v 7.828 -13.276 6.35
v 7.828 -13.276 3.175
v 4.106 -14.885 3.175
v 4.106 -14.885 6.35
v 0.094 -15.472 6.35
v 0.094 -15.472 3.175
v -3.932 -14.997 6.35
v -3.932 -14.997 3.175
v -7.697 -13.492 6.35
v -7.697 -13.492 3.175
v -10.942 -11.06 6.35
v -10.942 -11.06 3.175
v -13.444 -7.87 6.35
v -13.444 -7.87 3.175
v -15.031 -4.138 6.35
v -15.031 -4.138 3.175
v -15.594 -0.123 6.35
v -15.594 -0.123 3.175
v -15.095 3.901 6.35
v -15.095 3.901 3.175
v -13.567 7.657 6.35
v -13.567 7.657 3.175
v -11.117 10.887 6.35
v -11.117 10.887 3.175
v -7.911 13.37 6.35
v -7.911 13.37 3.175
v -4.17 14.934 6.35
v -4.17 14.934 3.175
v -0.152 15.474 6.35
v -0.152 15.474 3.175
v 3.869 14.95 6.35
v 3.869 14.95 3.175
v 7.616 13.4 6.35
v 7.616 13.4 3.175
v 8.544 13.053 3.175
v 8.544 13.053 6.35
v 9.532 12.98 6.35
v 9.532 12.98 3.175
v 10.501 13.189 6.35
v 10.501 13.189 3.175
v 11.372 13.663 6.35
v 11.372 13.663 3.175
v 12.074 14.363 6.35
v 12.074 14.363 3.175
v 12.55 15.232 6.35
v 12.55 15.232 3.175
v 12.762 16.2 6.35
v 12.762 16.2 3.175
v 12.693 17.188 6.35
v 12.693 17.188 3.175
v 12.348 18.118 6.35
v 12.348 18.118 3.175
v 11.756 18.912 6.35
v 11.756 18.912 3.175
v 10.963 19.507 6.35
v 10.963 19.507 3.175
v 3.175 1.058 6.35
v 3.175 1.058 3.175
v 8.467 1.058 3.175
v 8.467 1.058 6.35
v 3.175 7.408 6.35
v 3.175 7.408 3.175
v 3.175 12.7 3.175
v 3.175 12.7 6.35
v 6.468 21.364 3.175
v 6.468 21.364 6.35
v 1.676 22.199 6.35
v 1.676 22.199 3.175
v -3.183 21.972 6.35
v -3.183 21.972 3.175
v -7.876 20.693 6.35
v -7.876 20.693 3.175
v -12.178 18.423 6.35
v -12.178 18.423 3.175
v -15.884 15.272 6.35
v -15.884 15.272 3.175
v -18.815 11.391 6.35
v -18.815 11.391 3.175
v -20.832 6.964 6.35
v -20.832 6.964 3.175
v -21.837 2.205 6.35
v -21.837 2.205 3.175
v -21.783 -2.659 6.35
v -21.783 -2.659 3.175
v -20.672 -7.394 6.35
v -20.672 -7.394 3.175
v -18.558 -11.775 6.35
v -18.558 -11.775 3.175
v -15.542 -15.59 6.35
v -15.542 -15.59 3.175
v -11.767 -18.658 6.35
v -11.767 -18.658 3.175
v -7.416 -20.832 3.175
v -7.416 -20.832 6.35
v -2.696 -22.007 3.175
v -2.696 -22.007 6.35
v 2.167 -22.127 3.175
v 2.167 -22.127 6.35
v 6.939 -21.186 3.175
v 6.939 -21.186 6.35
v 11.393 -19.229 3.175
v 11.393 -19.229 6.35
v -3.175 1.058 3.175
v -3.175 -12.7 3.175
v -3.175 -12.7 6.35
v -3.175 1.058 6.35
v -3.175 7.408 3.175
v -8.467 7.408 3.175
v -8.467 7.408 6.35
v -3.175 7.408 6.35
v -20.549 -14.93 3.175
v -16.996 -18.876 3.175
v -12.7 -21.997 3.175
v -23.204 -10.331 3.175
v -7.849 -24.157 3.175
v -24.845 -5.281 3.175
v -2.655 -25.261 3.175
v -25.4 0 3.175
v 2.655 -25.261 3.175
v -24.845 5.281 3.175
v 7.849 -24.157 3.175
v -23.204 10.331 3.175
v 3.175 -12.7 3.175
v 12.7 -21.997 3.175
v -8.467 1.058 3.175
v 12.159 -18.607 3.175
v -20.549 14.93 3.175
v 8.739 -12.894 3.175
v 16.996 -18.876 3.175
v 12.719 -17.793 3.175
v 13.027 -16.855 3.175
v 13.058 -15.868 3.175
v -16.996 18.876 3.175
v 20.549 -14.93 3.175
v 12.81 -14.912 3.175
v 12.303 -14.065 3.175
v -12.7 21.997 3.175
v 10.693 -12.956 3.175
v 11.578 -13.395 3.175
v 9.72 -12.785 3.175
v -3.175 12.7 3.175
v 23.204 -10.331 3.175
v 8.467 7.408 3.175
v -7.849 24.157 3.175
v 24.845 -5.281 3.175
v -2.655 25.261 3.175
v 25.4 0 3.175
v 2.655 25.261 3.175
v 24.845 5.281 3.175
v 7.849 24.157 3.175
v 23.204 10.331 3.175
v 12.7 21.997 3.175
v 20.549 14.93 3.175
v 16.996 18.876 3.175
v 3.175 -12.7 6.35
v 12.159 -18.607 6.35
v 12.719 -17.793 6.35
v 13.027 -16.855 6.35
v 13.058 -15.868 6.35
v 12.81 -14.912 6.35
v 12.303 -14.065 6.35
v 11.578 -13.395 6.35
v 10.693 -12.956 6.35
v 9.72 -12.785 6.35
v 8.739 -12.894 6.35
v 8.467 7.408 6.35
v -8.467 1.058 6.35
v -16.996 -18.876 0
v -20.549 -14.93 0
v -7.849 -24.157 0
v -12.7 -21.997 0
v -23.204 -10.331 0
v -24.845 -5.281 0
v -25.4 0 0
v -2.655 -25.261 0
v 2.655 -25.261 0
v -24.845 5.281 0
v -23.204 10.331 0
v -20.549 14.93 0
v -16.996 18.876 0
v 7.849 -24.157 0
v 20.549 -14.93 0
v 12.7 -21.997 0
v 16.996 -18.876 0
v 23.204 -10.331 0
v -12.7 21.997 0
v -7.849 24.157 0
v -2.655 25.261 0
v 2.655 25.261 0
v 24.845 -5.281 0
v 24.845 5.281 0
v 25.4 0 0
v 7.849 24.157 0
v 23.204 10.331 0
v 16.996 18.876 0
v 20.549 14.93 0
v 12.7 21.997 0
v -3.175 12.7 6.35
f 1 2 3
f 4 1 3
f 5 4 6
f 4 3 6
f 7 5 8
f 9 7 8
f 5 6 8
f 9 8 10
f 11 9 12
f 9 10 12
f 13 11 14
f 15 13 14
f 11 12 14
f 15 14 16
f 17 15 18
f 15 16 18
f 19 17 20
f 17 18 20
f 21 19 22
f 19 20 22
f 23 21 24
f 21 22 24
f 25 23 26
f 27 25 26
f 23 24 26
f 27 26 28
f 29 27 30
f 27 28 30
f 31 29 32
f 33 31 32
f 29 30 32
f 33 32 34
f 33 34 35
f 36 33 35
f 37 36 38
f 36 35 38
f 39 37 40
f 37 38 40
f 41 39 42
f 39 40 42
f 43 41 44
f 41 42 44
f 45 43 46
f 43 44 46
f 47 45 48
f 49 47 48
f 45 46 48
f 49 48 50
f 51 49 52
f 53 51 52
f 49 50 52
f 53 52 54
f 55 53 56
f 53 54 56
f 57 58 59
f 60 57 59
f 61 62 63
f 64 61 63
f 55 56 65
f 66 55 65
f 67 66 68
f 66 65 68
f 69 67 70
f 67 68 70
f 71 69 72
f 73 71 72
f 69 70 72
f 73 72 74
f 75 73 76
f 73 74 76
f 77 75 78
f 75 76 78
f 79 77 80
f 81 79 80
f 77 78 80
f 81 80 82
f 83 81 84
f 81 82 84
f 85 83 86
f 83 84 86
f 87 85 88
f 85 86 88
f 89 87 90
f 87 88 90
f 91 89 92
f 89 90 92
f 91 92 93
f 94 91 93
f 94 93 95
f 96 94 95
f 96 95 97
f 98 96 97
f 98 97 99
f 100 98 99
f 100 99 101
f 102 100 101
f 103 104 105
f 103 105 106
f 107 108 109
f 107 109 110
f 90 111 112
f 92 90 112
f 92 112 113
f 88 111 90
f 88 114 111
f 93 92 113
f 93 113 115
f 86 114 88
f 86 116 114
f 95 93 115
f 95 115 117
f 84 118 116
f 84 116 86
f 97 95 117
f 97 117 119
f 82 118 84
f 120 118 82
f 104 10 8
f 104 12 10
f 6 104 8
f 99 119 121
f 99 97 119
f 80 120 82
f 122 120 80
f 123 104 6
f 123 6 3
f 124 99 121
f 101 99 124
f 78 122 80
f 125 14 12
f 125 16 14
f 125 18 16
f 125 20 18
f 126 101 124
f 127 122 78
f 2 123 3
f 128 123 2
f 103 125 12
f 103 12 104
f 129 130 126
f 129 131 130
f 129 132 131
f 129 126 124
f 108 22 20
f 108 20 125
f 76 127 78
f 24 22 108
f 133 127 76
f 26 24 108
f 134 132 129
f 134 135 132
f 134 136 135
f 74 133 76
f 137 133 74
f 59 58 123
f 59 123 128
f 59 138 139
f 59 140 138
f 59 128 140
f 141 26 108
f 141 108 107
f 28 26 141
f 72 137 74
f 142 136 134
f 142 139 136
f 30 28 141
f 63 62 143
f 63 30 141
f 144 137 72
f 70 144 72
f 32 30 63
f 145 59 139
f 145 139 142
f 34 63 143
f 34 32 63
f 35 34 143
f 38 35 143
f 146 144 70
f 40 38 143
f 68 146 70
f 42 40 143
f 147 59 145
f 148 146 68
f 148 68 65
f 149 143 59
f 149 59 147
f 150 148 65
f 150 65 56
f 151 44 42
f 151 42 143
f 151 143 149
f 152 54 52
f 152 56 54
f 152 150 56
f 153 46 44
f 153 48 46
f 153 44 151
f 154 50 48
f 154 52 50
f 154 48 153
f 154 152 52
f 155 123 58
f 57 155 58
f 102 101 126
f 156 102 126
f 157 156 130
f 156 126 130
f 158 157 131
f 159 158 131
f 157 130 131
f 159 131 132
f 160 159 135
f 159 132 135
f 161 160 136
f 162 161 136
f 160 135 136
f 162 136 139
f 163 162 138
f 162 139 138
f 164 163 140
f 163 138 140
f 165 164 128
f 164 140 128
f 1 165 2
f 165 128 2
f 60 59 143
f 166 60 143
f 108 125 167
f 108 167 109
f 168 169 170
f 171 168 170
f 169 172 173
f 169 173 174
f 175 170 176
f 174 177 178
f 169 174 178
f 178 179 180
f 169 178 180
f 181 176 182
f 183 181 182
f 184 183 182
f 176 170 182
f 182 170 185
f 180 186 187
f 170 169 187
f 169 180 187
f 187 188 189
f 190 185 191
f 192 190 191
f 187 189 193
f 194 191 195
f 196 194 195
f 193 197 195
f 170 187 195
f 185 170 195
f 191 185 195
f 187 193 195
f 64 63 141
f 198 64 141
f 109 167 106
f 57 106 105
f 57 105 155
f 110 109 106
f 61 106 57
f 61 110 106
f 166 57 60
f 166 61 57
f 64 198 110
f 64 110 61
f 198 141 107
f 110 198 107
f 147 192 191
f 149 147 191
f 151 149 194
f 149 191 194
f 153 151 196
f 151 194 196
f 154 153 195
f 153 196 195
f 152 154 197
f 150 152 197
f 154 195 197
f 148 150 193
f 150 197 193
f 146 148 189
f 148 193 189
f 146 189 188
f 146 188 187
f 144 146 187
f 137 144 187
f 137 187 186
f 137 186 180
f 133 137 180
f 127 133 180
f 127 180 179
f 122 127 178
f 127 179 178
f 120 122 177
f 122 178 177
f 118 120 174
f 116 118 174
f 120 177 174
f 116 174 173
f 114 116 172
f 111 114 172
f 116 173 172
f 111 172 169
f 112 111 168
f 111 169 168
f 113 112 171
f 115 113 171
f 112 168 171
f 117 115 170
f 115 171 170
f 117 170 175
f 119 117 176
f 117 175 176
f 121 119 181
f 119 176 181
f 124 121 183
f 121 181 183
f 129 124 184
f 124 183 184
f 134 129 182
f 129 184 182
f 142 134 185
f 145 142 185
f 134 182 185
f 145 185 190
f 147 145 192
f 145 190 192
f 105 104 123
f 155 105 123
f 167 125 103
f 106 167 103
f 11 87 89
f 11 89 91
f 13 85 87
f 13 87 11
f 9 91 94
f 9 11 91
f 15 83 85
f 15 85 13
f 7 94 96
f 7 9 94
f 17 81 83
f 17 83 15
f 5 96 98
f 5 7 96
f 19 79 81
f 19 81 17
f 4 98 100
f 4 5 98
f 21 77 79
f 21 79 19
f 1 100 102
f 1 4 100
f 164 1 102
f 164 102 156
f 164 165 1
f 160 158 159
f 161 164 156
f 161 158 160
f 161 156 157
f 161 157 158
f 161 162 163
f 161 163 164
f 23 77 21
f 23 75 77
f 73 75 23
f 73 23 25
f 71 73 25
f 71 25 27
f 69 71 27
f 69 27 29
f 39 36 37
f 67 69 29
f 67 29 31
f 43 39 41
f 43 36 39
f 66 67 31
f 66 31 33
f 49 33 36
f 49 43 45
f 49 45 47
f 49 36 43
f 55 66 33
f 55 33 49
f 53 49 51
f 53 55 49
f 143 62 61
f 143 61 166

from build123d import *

# Parameters (mm, degrees)
F0_R     = 25.4
F1_DEPTH = 3.175
F2_W     = 3.175
F2_H     = 5.2916666667
F2_H_2   = 6.35
F2_W_2   = 5.2916666667
F2_H_3   = 13.7583333333
F3_DEPTH = 3.175


with BuildPart() as f1:
    # F0 (on Top) → F1 (new body)
    with BuildSketch(Plane.XY):
        Circle(F0_R)
    extrude(amount=F1_DEPTH)

    # F2 (on face) → F3 (join)
    with BuildSketch(Plane.XY.offset(3.175)):
        with BuildLine():
            ThreePointArc((7.6158286859, 13.4004975857), (12.3428438476, 14.7800857354), (10.9632556979, 19.507100897))
            ThreePointArc((10.9632556979, 19.507100897), (-21.9435583177, -0.2281861691), (11.3925767917, -19.2292929842))
            ThreePointArc((11.3925767917, -19.2292929842), (12.5870002145, -14.4702118742), (7.8279191045, -13.2757884514))
            ThreePointArc((7.8279191045, -13.2757884514), (-15.5940249542, -0.1230190166), (7.6158286859, 13.4004975857))
        make_face()
        with Locations((-1.5875, 10.0541666667)):
            Rectangle(F2_W, F2_H)
        with Locations((1.5875, 10.0541666667)):
            Rectangle(F2_W, F2_H)
        with Locations((1.5875, 4.2333333333)):
            Rectangle(F2_W, F2_H_2)
        with Locations((5.8208333333, 4.2333333333)):
            Rectangle(F2_W_2, F2_H_2)
        with Locations((-1.5875, 4.2333333333)):
            Rectangle(F2_W, F2_H_2)
        with Locations((-5.8208333333, 4.2333333333)):
            Rectangle(F2_W_2, F2_H_2)
        with Locations((-1.5875, -5.8208333333)):
            Rectangle(F2_W, F2_H_3)
        with Locations((1.5875, -5.8208333333)):
            Rectangle(F2_W, F2_H_3)
    extrude(amount=F3_DEPTH)


solid = f1.part
